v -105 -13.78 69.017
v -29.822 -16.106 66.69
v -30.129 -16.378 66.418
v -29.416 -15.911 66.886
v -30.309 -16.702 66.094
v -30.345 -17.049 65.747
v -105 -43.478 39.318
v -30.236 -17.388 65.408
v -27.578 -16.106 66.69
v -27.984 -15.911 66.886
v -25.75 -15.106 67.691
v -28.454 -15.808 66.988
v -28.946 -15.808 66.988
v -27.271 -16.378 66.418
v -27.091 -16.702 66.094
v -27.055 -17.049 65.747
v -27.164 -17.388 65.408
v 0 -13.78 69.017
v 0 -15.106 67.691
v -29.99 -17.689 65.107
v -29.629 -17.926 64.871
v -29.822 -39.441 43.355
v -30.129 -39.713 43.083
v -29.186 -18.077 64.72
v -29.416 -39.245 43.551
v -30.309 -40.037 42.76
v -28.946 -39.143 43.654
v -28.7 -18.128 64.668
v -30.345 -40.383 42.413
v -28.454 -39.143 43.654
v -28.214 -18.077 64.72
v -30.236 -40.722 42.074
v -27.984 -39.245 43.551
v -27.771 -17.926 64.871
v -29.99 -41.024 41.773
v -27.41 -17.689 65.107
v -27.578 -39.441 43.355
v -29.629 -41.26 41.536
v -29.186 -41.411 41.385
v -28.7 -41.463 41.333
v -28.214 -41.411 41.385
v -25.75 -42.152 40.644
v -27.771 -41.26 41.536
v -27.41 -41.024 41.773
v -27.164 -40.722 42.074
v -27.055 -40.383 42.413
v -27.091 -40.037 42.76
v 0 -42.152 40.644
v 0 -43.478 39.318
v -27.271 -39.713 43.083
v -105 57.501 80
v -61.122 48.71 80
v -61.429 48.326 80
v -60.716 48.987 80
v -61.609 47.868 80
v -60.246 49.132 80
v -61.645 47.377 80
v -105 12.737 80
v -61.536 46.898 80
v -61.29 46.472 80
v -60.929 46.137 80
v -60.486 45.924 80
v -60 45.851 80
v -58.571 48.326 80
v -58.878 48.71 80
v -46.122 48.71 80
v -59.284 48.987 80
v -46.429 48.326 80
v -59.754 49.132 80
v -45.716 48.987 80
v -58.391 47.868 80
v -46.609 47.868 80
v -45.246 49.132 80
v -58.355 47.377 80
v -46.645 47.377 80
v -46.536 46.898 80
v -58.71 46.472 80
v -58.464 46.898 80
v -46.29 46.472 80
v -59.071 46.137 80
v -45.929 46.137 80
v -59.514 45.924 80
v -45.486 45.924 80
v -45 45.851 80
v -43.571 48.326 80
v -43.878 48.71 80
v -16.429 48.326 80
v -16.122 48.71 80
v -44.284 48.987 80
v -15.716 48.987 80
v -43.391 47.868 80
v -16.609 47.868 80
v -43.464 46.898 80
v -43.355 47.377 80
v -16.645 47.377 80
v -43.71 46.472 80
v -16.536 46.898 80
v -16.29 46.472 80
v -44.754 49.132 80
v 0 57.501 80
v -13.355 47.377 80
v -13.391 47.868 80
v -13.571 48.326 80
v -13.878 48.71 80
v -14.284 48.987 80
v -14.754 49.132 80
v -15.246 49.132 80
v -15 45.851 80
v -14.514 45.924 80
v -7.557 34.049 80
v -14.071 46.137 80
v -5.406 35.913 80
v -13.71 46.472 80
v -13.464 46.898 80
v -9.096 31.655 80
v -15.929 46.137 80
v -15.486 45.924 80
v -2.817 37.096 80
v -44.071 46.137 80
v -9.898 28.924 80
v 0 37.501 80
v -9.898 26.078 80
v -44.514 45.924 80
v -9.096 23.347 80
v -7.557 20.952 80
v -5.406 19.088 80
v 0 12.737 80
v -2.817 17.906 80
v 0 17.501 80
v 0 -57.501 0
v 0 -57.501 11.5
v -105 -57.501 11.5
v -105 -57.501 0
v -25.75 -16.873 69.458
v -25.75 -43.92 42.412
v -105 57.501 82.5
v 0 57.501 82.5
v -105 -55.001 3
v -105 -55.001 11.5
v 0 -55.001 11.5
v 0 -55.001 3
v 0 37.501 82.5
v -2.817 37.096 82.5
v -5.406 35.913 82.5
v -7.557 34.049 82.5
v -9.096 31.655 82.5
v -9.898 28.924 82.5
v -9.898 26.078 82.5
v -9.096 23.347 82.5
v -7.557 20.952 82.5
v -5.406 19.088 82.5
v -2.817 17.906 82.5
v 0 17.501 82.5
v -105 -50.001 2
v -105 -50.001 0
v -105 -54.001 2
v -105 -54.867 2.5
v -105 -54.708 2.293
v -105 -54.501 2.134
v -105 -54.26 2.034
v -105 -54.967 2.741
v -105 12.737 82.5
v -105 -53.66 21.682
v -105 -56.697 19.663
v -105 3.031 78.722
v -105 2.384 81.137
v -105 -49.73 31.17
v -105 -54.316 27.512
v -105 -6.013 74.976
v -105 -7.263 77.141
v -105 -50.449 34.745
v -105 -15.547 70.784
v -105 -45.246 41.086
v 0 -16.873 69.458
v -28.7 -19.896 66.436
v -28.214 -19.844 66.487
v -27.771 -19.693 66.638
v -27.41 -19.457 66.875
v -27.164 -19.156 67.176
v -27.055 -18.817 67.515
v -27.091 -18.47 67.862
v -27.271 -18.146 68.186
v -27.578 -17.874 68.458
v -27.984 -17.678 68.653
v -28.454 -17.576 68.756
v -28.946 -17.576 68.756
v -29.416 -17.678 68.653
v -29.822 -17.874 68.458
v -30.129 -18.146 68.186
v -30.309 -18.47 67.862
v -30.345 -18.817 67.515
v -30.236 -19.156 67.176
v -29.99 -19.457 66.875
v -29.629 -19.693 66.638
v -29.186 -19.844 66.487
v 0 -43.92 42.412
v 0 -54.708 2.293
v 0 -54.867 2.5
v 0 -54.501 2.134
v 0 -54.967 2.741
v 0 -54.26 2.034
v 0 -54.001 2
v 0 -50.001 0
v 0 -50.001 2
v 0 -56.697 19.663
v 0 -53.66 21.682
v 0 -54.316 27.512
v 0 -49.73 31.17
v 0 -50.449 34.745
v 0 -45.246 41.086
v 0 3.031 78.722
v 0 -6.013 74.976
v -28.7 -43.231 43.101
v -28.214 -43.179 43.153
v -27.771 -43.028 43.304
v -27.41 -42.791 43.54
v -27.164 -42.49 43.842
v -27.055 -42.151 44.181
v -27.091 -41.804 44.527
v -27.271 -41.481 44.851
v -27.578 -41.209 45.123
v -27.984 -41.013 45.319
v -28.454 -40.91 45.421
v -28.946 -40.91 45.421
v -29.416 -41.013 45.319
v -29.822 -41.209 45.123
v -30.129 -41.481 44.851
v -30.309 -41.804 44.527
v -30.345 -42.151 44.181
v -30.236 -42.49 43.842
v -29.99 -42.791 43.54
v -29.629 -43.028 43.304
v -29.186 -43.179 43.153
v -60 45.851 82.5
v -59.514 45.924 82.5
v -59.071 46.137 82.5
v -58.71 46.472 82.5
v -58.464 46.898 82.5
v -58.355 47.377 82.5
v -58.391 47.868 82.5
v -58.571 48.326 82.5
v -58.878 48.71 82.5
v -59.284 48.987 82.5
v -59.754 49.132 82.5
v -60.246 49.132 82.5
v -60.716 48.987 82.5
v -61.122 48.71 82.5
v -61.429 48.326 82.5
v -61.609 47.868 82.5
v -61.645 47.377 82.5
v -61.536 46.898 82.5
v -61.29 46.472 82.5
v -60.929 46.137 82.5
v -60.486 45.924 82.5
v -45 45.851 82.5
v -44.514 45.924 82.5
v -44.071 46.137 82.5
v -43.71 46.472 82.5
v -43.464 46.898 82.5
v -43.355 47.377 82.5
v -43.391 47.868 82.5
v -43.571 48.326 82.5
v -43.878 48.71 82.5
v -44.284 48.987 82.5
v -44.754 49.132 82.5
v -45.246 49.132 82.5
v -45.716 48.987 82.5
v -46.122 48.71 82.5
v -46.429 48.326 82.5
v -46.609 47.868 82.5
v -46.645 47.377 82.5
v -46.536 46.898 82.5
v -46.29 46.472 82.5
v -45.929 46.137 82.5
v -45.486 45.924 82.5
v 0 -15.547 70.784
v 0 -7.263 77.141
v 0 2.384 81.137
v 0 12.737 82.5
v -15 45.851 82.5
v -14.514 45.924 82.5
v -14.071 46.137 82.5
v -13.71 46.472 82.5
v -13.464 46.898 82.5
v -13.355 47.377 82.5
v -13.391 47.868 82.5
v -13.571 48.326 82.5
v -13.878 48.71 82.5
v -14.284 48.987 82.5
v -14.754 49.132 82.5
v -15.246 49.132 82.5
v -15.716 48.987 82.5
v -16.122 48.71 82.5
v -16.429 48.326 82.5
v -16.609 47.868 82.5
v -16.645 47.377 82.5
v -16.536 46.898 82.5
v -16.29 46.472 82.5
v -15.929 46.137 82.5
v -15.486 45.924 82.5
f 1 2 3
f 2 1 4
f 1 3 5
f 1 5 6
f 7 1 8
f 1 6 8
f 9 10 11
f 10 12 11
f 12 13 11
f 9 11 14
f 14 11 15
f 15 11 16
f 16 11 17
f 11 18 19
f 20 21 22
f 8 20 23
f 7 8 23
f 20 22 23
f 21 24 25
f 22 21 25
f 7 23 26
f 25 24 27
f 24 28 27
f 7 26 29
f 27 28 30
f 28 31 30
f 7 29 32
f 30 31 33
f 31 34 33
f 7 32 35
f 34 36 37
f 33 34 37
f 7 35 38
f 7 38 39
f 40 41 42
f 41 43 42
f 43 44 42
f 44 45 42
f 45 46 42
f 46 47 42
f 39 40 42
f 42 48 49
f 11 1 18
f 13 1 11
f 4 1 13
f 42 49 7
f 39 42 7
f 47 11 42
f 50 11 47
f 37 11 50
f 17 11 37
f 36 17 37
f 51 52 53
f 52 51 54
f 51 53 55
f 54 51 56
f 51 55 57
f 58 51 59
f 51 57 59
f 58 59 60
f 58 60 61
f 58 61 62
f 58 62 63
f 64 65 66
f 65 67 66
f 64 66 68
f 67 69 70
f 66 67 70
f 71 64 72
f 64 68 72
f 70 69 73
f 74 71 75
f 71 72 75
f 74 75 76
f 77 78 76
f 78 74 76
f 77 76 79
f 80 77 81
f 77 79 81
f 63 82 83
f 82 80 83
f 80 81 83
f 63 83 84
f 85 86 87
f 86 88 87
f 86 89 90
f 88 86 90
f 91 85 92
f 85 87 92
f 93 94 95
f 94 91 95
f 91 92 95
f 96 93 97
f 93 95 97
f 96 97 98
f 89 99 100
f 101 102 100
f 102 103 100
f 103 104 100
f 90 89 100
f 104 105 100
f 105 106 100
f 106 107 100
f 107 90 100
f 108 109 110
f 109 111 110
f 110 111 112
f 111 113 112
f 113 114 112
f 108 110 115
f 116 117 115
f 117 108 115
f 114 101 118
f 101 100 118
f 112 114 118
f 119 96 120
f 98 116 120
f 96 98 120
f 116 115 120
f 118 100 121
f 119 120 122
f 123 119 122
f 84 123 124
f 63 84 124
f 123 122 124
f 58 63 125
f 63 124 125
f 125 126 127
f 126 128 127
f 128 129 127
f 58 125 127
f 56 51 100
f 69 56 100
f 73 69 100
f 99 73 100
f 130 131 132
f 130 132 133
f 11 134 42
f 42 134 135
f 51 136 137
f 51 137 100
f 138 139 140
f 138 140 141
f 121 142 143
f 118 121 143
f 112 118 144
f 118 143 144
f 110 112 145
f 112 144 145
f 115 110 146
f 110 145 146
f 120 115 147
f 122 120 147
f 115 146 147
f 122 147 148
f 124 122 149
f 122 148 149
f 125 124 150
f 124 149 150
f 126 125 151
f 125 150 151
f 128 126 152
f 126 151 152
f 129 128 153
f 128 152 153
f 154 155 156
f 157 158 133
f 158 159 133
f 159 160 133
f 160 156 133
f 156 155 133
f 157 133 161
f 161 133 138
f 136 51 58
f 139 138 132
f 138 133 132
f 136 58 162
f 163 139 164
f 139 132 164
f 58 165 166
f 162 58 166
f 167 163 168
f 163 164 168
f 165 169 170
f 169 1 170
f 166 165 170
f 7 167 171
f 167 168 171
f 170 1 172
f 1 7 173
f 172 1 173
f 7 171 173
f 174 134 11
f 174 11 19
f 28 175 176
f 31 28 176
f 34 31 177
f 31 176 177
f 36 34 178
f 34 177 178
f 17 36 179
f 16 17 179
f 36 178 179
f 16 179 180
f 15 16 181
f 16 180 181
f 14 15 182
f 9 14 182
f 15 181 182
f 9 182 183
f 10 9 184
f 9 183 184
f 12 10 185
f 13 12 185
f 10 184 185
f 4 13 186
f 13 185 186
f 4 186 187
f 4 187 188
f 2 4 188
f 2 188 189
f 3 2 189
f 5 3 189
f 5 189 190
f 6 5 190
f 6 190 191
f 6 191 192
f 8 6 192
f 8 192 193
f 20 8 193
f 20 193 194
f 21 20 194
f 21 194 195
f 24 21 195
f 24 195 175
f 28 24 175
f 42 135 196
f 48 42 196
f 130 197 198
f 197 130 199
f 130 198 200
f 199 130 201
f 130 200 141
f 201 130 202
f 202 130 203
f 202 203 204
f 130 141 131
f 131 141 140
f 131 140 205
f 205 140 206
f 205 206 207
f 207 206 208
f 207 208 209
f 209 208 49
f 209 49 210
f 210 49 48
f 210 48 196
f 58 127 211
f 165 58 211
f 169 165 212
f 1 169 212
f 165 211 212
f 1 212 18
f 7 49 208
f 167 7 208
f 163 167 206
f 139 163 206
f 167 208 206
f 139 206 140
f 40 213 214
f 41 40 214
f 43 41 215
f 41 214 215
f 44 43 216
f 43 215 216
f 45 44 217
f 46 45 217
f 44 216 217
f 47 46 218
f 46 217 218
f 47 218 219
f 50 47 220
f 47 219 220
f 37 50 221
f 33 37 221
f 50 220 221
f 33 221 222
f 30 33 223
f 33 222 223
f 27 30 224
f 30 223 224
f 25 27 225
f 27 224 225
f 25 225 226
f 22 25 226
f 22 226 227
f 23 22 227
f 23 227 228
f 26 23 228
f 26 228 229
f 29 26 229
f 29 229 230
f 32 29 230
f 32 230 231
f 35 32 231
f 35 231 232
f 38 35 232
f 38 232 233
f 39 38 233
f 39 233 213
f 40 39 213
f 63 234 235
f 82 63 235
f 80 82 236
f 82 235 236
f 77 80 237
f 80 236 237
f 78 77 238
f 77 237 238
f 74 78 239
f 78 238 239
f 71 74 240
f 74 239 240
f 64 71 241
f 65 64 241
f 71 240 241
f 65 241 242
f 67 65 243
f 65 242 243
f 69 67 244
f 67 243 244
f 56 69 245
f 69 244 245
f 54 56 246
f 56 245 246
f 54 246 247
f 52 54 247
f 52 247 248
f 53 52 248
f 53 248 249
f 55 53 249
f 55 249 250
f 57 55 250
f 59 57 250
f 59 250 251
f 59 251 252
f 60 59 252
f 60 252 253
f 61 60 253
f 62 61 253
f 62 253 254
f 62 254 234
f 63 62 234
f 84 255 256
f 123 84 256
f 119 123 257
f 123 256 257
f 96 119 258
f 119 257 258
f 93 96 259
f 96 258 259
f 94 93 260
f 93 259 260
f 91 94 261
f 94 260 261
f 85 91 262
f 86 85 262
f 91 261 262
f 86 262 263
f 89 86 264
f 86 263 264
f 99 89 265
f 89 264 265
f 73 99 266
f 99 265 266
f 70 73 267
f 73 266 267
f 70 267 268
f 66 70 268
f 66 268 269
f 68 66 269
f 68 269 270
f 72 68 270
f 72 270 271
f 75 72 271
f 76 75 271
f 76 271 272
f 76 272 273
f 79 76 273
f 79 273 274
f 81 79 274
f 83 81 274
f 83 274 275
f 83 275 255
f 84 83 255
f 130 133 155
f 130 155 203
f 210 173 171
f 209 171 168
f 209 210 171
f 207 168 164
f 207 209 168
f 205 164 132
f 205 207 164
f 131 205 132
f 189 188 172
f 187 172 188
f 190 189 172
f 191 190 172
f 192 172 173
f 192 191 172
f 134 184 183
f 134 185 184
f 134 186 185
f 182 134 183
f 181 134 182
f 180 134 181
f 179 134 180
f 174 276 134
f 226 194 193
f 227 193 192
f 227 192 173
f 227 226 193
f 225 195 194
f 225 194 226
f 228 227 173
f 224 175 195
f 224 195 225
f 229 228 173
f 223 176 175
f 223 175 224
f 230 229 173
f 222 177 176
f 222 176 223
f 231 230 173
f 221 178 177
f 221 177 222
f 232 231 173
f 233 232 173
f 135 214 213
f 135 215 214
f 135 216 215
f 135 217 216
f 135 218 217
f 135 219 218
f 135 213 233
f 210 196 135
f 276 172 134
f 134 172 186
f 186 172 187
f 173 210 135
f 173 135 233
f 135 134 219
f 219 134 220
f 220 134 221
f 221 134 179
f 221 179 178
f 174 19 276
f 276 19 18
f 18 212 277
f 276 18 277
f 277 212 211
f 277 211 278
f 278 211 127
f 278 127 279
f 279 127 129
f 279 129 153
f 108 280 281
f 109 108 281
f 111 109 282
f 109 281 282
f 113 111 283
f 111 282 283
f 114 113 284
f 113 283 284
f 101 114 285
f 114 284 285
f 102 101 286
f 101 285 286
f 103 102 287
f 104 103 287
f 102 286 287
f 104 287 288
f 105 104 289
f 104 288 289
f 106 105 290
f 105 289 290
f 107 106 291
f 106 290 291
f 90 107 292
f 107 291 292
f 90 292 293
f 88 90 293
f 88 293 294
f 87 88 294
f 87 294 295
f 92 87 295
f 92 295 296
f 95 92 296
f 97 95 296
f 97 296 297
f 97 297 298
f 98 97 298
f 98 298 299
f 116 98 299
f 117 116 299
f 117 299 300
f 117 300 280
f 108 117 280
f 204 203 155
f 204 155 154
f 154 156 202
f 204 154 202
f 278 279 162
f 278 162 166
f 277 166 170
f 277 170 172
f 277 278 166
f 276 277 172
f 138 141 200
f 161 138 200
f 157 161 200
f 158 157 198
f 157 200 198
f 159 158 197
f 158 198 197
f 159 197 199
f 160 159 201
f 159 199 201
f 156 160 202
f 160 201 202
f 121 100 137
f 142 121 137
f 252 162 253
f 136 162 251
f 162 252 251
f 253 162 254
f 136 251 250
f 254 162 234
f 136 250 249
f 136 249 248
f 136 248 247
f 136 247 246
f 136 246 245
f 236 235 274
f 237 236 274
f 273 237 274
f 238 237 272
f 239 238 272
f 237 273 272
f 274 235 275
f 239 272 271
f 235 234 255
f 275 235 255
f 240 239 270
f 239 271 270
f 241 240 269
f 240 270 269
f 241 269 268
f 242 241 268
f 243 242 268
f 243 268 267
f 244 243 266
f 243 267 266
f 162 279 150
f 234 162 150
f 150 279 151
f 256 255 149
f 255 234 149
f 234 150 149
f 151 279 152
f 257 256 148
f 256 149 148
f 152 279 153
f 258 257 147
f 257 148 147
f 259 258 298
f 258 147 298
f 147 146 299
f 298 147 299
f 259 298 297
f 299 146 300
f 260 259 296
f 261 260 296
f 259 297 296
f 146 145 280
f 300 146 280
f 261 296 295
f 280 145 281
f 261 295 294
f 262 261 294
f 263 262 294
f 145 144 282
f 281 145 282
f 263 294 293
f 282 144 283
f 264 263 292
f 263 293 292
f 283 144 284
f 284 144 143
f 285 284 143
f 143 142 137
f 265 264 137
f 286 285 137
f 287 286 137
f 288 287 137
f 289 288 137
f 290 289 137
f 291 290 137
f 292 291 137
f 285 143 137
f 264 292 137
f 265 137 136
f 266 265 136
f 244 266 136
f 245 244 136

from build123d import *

# Parameters (mm, degrees)
PAD_DEPTH            = 105
PAD_DEPTH_BACK       = 105
SKETCH001_R          = 1.65
SKETCH001_W          = 38.25
SKETCH001_H          = 51.5
POCKET_DEPTH         = 101.705966
SKETCH003_R          = 1.65
POCKET001_DEPTH      = 5
SKETCH004_W          = 2
SKETCH004_H          = 210
PAD001_DEPTH         = 5
FILLET_R             = 1
SKETCH005_R          = 10
POCKET002_DEPTH      = 5
SKETCH006_W          = 110
SKETCH006_H          = 90
POCKET003_DEPTH      = 100
POCKET003_DEPTH_BACK = -72


with BuildPart() as part:
    # Sketch → Pad (new body, two sides)
    with BuildSketch(Plane.YZ) as pad_sk:
        with BuildLine():
            Line((12.736792, 82.5), (57.500792, 82.5))
            Line((57.500792, 82.5), (57.500792, 80))
            Line((57.500792, 80), (12.736792, 80))
            ThreePointArc((12.736792, 80), (-1.613837, 77.145482), (-13.779712, 69.016504))
            Line((-13.779712, 69.016504), (-43.478197, 39.318019))
            ThreePointArc((-43.478197, 39.318019), (-52.006167, 26.55501), (-55.000792, 11.500014))
            Line((-55.000792, 11.500014), (-55.000792, 0))
            Line((-55.000792, 0), (-57.500792, 0))
            Line((-57.500792, 11.500014), (-57.500792, 0))
            ThreePointArc((-45.245964, 41.085786), (-54.315866, 27.511719), (-57.500792, 11.500014))
            Line((-15.547479, 70.784271), (-45.245964, 41.085786))
            ThreePointArc((12.736792, 82.5), (-2.570545, 79.455181), (-15.547479, 70.784271))
        make_face()
    extrude(amount=PAD_DEPTH)
    extrude(pad_sk.sketch, amount=-PAD_DEPTH_BACK)

    # Sketch001 (on Face12 of Pad) → Pocket (cut, through all)
    with BuildSketch(Plane(origin=(0, -43.165875, 43.165875), x_dir=(0, -0.707107, -0.707107), z_dir=(0, -0.707107, 0.707107))):
        with Locations((-34.55831, 28.7)):
            Circle(SKETCH001_R)
        with Locations((-1.55831, 28.7)):
            Circle(SKETCH001_R)
        with Locations((-34.55831, -28.7)):
            Circle(SKETCH001_R)
        with Locations((-1.55831, -28.7)):
            Circle(SKETCH001_R)
        with Locations((-18.05831, 0)):
            Rectangle(SKETCH001_W, SKETCH001_H)
    extrude(amount=-POCKET_DEPTH, mode=Mode.SUBTRACT)

    # Sketch003 (on Face2 of Pocket) → Pocket001 (cut)
    with BuildSketch(Plane(origin=(0, 0, 82.5), x_dir=(0, -1, 0), z_dir=(0, 0, 1))):
        with Locations((-47.500792, 15)):
            Circle(SKETCH003_R)
        with Locations((-47.500792, 45)):
            Circle(SKETCH003_R)
        with Locations((-47.500792, -15)):
            Circle(SKETCH003_R)
        with Locations((-47.500792, -45)):
            Circle(SKETCH003_R)
        with Locations((-47.500792, 60)):
            Circle(SKETCH003_R)
        with Locations((-47.500792, -60)):
            Circle(SKETCH003_R)
    extrude(amount=-POCKET001_DEPTH, mode=Mode.SUBTRACT)

    # Sketch004 (on Face26 of Pocket001) → Pad001 (join)
    with BuildSketch(Plane.ZX.offset(-55.000792)):
        with Locations((1, 0)):
            Rectangle(SKETCH004_W, SKETCH004_H)
    extrude(amount=PAD001_DEPTH)

    # Fillet
    fillet_edges = [part.edges().sort_by_distance(p)[0] for p in [
        (0, -55.000792, 2),
    ]]
    fillet(fillet_edges, radius=FILLET_R)

    # Sketch005 (on Face15 of Fillet) → Pocket002 (cut)
    with BuildSketch(Plane(origin=(0, 0, 82.5), x_dir=(0, -1, 0), z_dir=(0, 0, 1))):
        with Locations((-27.500792, 0)):
            Circle(SKETCH005_R)
    extrude(amount=-POCKET002_DEPTH, mode=Mode.SUBTRACT)

    # Sketch006 → Pocket003 (cut, two sides)
    with BuildSketch(Plane.XZ) as pocket003_sk:
        with Locations((55, 45)):
            Rectangle(SKETCH006_W, SKETCH006_H)
    extrude(amount=-POCKET003_DEPTH, mode=Mode.SUBTRACT)
    extrude(pocket003_sk.sketch, amount=-POCKET003_DEPTH_BACK, mode=Mode.SUBTRACT)


solid = part.part
